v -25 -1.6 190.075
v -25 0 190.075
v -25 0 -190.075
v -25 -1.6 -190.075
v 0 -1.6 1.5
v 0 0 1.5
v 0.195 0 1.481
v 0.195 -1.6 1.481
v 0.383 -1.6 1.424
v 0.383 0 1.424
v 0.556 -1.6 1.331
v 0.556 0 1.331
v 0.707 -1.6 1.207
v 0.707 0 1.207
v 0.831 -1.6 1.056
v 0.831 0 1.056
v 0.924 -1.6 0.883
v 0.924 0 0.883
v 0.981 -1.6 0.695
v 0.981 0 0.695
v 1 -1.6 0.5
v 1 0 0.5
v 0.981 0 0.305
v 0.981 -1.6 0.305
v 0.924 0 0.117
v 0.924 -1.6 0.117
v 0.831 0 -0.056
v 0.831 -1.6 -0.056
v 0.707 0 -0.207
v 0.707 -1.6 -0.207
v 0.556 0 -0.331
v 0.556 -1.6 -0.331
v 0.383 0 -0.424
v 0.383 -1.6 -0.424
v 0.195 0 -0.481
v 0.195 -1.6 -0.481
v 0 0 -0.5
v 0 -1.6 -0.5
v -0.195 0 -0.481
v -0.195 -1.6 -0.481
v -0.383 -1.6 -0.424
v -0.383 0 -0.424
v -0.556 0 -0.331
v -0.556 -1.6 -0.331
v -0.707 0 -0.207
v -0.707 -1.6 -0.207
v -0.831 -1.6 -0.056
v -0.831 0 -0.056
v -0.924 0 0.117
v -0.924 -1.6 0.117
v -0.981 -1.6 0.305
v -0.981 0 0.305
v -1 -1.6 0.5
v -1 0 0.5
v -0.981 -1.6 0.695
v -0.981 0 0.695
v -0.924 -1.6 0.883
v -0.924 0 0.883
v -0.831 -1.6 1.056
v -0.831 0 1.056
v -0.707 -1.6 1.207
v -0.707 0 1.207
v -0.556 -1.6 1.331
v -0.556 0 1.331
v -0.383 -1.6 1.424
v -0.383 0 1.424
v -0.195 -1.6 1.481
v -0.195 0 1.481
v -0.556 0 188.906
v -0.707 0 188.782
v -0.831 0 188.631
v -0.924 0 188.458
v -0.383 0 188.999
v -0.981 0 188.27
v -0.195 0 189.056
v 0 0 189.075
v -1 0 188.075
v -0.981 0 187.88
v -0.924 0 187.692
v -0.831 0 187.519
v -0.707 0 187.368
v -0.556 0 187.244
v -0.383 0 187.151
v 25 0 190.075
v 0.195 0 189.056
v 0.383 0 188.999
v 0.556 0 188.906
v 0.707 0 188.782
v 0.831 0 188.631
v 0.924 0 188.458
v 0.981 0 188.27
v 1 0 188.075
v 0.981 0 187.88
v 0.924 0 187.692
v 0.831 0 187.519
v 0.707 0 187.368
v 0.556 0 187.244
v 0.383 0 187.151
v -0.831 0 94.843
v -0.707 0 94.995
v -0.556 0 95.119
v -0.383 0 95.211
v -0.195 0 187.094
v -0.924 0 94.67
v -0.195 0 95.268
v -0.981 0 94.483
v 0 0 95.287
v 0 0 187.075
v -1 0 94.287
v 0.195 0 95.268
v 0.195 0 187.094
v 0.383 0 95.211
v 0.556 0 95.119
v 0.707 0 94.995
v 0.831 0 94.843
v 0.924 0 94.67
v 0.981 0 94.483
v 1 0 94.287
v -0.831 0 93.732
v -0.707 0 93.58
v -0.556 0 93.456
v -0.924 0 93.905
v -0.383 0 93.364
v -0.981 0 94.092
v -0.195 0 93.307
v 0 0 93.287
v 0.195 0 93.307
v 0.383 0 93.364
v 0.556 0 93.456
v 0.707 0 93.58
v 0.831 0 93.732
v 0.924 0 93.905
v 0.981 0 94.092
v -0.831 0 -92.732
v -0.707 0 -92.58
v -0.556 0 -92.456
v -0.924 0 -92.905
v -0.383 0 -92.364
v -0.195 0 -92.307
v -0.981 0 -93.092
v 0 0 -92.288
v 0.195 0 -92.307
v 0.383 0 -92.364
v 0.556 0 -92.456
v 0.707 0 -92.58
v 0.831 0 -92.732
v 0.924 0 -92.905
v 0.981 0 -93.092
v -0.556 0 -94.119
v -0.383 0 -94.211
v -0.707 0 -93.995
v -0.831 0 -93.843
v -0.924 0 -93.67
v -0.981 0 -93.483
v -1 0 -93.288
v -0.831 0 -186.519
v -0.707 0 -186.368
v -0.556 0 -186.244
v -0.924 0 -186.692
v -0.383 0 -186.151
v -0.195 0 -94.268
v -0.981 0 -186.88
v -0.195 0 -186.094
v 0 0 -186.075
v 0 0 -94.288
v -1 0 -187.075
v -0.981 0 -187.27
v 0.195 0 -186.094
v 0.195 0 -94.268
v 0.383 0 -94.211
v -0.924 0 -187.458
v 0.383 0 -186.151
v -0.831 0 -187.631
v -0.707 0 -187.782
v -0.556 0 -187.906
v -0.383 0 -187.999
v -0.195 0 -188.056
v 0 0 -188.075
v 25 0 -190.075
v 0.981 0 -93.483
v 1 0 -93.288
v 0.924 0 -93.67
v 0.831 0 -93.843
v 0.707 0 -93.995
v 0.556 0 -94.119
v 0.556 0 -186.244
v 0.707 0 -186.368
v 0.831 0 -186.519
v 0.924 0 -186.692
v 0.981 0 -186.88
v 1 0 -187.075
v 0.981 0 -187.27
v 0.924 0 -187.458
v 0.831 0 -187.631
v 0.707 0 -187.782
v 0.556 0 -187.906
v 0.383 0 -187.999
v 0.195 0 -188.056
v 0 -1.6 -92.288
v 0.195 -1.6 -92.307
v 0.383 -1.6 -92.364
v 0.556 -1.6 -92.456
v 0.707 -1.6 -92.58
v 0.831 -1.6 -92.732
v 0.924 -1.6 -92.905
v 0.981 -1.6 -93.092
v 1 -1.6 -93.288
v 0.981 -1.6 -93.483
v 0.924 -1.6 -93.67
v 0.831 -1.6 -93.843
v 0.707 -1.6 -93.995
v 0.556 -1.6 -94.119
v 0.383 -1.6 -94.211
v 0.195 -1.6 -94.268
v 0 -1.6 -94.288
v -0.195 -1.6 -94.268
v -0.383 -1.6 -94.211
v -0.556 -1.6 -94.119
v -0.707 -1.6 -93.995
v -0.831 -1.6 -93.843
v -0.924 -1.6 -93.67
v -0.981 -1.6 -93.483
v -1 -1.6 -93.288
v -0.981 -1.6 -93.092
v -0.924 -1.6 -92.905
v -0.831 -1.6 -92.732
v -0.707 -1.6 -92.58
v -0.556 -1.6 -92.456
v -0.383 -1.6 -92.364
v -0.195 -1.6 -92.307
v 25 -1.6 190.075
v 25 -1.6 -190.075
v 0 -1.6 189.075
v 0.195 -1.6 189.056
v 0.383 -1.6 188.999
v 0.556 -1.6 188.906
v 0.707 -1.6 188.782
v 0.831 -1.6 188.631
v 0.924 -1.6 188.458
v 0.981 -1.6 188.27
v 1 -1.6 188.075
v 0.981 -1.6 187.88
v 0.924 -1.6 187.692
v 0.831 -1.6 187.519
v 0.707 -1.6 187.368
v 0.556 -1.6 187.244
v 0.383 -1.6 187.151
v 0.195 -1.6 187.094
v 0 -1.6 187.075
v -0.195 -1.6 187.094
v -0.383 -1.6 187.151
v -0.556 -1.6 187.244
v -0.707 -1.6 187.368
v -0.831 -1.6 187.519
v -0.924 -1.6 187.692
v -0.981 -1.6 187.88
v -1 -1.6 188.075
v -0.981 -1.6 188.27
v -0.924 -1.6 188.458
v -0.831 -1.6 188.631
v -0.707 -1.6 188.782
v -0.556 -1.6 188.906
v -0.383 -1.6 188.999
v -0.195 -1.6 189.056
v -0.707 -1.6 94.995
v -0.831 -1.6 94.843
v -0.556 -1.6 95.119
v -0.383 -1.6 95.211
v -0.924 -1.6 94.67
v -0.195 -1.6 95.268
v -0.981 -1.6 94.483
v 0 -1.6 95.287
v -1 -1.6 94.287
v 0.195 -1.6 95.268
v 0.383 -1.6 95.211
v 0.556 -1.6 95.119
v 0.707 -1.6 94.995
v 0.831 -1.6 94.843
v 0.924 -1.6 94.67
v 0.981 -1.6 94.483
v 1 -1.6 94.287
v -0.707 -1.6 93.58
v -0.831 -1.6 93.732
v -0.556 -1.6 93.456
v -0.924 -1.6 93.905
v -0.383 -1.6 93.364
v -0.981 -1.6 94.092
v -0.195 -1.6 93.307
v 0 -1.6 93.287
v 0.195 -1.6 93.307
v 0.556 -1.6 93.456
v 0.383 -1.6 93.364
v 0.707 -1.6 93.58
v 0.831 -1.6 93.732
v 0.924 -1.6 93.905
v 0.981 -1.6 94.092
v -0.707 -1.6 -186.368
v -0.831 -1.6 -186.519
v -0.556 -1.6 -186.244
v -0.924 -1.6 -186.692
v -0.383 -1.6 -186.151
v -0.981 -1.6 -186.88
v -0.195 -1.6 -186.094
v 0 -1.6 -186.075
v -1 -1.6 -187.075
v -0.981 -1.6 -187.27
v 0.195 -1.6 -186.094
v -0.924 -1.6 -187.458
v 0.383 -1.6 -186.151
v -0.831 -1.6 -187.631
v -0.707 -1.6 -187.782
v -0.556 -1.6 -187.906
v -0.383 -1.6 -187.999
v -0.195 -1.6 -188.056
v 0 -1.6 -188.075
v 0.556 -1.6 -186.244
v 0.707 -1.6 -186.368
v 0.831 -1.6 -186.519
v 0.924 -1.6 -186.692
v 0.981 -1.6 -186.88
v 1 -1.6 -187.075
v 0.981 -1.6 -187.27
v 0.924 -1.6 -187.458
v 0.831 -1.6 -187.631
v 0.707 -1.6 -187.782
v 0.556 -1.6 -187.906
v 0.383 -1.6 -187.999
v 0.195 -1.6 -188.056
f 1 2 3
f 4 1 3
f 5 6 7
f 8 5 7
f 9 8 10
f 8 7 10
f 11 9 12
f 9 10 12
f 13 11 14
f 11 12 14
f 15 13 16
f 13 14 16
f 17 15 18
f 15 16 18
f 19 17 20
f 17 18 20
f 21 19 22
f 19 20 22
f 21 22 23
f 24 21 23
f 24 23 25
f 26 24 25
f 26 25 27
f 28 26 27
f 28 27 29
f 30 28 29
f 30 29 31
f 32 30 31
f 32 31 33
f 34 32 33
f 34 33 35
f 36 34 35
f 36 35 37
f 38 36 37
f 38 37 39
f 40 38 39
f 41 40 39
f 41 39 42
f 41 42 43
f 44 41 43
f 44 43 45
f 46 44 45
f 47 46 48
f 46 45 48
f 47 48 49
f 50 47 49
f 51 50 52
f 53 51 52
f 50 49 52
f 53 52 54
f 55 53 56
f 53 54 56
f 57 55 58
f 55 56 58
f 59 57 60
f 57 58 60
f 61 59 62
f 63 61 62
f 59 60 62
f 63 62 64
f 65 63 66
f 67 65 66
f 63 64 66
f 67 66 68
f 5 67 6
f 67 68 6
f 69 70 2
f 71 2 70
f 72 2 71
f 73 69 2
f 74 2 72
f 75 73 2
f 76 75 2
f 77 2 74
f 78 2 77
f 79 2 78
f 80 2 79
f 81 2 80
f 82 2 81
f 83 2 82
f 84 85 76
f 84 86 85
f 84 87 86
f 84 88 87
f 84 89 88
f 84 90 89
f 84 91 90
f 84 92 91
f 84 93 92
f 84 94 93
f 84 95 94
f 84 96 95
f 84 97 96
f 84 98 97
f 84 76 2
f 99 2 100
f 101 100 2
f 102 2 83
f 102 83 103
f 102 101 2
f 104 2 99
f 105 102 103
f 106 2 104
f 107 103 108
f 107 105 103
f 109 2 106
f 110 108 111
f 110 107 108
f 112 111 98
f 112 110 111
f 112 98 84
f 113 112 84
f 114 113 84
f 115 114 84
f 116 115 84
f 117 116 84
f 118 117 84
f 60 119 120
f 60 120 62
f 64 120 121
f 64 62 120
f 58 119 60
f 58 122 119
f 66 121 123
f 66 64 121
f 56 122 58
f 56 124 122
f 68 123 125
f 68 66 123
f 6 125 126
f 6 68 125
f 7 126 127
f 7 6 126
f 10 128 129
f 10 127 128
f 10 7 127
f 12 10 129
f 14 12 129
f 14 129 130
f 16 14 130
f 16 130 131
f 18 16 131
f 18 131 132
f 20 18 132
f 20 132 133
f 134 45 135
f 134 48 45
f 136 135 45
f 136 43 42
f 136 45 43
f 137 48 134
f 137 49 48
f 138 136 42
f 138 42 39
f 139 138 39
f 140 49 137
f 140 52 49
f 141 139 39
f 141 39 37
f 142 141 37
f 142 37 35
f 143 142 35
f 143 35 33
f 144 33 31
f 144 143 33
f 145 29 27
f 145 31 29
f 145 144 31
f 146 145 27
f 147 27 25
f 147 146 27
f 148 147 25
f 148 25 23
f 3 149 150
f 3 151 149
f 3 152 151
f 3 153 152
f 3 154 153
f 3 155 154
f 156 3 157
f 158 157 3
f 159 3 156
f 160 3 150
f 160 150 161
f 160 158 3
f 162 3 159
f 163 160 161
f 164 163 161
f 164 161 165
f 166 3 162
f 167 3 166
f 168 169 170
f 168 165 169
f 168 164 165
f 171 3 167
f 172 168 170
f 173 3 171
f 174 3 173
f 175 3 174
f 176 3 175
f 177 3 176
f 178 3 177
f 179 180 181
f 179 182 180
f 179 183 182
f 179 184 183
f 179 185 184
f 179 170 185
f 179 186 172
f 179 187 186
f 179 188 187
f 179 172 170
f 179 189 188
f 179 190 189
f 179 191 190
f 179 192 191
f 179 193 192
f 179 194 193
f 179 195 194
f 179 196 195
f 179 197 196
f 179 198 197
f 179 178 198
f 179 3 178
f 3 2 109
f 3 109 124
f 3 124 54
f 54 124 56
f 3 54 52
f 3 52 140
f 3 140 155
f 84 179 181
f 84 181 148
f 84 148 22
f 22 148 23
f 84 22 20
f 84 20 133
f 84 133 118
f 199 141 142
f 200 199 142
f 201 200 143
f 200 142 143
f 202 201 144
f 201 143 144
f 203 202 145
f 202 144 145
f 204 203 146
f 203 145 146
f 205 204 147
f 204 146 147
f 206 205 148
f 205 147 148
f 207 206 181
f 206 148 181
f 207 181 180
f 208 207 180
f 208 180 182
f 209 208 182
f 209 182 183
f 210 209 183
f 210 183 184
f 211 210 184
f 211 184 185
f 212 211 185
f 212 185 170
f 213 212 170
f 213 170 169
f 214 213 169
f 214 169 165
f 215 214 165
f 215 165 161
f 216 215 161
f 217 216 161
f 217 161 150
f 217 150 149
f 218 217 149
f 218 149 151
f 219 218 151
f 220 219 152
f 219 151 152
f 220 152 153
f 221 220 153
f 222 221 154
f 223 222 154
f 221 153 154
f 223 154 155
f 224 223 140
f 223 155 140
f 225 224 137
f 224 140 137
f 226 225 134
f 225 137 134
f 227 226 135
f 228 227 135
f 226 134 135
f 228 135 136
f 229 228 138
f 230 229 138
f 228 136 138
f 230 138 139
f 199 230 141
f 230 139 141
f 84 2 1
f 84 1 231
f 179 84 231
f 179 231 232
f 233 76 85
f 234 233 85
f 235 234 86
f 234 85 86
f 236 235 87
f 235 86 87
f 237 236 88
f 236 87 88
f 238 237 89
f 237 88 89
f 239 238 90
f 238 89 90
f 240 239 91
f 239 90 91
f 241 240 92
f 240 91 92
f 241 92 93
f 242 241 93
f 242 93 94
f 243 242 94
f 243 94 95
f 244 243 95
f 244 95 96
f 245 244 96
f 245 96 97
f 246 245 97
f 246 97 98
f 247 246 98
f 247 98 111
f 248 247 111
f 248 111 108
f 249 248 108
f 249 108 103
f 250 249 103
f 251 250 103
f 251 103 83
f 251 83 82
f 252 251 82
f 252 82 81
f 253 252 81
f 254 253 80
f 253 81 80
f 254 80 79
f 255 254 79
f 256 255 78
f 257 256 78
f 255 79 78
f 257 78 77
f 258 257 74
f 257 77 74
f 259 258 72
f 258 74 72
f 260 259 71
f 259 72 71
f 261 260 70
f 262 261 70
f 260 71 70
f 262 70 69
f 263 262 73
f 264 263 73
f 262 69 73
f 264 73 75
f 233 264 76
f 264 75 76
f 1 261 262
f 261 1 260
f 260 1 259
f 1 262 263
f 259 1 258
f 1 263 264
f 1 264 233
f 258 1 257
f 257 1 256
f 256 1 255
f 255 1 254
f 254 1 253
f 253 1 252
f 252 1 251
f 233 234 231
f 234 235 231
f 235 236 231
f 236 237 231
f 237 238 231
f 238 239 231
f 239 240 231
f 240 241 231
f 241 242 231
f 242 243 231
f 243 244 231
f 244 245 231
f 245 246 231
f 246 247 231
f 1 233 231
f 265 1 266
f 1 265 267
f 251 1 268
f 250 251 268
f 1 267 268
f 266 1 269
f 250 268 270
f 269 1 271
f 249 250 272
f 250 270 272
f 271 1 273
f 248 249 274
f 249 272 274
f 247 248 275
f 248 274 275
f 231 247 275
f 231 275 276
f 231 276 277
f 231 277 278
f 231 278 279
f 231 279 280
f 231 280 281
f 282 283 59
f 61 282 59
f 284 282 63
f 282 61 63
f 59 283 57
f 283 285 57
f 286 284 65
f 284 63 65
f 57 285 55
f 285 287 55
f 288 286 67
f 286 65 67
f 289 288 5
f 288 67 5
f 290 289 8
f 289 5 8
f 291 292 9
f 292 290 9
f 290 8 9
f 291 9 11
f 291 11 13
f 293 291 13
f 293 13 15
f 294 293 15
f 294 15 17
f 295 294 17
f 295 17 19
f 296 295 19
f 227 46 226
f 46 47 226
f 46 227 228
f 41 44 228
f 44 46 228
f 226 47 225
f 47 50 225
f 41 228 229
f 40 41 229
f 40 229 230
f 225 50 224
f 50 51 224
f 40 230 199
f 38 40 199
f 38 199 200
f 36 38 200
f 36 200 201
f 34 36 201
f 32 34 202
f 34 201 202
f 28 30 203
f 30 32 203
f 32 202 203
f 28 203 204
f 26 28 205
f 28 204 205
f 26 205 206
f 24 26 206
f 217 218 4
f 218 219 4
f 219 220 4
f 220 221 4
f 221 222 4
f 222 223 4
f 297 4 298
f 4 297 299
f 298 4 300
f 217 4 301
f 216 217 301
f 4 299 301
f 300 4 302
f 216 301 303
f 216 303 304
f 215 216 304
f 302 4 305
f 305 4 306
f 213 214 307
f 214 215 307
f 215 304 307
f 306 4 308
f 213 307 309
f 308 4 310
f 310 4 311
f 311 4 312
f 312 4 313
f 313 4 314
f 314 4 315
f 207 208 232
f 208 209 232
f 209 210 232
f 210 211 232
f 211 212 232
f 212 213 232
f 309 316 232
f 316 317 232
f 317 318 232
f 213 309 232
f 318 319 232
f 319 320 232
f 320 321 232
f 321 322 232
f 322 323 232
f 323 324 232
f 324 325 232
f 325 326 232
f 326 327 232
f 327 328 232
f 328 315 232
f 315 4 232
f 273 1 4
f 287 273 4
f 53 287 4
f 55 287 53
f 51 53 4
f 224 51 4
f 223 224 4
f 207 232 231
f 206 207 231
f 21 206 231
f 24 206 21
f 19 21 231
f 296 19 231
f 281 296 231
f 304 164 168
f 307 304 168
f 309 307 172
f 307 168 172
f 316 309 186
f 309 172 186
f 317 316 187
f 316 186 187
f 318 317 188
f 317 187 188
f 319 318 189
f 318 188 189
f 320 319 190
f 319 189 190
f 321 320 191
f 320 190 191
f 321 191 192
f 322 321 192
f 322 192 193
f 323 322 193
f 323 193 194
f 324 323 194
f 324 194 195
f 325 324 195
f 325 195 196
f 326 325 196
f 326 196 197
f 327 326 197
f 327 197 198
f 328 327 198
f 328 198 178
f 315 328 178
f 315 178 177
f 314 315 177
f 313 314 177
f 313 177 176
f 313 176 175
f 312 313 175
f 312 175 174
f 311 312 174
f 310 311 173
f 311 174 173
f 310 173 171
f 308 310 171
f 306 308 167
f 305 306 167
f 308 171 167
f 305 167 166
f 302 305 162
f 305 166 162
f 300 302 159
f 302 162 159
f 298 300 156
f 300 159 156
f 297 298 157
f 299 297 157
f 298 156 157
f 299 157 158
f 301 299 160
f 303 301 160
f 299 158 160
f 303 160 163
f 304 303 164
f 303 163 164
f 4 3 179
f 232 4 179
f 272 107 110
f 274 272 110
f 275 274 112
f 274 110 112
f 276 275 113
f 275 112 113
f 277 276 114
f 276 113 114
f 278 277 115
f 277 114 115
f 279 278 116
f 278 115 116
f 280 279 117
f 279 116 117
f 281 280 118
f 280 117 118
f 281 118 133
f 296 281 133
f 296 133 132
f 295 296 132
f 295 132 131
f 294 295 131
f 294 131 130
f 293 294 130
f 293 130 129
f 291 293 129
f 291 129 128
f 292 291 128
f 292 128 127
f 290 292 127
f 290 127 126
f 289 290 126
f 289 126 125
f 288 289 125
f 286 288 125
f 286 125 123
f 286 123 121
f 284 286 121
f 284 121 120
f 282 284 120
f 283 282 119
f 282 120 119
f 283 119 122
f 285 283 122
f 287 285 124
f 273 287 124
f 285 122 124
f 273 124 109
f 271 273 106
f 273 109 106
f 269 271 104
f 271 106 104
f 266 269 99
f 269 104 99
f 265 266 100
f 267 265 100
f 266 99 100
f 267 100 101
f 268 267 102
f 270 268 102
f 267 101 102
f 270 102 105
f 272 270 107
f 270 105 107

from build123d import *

# Parameters (mm, degrees)
SKETCH1_W          = 50
SKETCH1_H          = 380.15
BASE_FLANGE1_DEPTH = 1.6
SKETCH6_R          = 1
CUT_EXTRUDE1_DEPTH = 10
LPATTERN1_COUNT    = 5
LPATTERN1_PITCH    = 93.7875


# Sheet-metal steps are written as plain solids
with BuildPart() as part:
    # Sketch1 → Base-Flange1 (new body)
    with BuildSketch(Plane(origin=(0, 0, 0), x_dir=(1, 0, 0), z_dir=(0, 1, 0))):
        Rectangle(SKETCH1_W, SKETCH1_H)
    extrude(amount=-BASE_FLANGE1_DEPTH)

    # Sketch6 → Cut-Extrude1 (cut)
    with BuildSketch(Plane(origin=(0, 0, 0), x_dir=(1, 0, 0), z_dir=(0, 1, 0))):
        with Locations(Location((0, 187.075, 0), (0, 0, 270))):
            Circle(SKETCH6_R)
    cut_extrude1 = extrude(amount=-CUT_EXTRUDE1_DEPTH, mode=Mode.SUBTRACT)

    # LPattern1: Cut-Extrude1 ×5
    with Locations(*[(0, 0, i * LPATTERN1_PITCH) for i in range(1, LPATTERN1_COUNT)]):
        add(cut_extrude1, mode=Mode.SUBTRACT)


solid = part.part
